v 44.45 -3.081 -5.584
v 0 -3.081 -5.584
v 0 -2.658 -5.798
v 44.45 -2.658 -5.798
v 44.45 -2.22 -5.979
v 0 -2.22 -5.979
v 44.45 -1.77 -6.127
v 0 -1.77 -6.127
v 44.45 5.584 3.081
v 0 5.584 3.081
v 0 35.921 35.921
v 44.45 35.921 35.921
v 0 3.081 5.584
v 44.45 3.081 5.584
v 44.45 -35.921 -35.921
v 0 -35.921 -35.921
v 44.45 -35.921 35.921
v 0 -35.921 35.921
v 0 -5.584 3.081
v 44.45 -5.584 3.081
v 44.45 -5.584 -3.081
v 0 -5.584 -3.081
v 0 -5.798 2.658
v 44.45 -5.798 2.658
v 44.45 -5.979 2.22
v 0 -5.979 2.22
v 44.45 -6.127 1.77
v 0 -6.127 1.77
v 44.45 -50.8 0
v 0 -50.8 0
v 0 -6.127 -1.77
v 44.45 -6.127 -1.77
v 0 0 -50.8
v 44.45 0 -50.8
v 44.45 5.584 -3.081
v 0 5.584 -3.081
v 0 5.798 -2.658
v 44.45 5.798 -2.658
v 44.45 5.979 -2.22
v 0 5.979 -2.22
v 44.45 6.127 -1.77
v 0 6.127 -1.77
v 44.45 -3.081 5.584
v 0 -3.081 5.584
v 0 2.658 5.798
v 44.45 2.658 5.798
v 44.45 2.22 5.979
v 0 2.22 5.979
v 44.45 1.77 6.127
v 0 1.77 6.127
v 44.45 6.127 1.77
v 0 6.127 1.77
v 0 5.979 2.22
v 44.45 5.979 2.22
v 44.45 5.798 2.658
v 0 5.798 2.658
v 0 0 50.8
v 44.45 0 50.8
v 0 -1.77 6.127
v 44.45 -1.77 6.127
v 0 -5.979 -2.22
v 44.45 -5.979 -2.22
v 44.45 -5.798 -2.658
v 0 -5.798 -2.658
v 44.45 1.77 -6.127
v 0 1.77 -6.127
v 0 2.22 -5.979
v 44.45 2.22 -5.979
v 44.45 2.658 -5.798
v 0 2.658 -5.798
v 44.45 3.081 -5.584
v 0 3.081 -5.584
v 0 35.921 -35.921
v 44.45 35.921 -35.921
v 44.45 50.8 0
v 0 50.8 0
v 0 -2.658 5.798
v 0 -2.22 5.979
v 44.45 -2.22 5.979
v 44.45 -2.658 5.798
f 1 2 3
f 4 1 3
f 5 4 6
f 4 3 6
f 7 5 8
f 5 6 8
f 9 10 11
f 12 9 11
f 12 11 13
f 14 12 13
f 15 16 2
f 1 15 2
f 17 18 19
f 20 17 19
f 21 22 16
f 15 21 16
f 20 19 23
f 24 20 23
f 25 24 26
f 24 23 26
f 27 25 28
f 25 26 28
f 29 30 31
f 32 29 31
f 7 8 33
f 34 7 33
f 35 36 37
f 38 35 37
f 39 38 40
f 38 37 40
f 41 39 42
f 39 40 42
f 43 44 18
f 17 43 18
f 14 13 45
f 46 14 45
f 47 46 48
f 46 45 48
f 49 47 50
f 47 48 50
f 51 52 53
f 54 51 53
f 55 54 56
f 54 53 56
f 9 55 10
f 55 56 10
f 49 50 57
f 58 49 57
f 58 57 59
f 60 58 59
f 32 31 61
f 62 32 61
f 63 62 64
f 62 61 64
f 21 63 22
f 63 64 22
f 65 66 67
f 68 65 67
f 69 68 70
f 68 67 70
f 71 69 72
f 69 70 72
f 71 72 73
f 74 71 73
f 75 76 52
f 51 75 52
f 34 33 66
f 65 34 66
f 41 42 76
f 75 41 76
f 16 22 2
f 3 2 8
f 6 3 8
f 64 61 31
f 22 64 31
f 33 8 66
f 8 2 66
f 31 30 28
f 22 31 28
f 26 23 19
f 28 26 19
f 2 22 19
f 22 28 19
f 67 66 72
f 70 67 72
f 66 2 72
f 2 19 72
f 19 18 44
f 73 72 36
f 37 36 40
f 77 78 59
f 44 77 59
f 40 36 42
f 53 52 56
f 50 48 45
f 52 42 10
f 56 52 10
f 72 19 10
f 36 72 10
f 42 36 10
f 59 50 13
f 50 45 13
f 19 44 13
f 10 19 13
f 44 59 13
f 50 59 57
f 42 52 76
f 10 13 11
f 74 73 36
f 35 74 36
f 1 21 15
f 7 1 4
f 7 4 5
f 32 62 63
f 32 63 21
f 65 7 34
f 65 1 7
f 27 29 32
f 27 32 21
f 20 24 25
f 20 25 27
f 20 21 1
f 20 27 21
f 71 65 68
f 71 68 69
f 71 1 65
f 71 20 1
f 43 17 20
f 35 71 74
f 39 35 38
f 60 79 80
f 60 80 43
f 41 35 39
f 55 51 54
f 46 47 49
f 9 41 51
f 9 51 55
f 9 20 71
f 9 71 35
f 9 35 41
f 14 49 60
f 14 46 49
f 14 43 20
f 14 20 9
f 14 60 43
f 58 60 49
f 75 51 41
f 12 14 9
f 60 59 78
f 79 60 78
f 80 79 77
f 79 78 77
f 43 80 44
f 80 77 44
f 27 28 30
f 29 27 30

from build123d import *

# Parameters (mm, degrees)
F1_DEPTH = 44.45


with BuildPart() as f1:
    # F0 (on Right) → F1 (new body)
    with BuildSketch(Plane.YZ):
        with BuildLine():
            Line((0, 0), (6.3777308804, 0))
            ThreePointArc((6.3777308804, 0), (6.3148103285, 0.8936563646), (6.1272901789, 1.7696797019))
            Line((6.1272901789, 1.7696797019), (4.4347789139, 1.8367274105))
            Line((4.4347789139, 1.8367274105), (1.9357257406, 1.9357257406))
            Line((1.9357257406, 1.9357257406), (0, 0))
        make_face()
        with BuildLine():
            Line((50.8, 0), (6.3777308804, 0))
            ThreePointArc((6.3777308804, 0), (6.3148103285, -0.8936563646), (6.1272901789, -1.7696797019))
            Line((6.1272901789, -1.7696797019), (50.8, 0))
        make_face()
        with BuildLine():
            ThreePointArc((6.1272901789, -1.7696797019), (6.3148103285, -0.8936563646), (6.3777308804, 0))
            Line((6.3777308804, 0), (0, 0))
            Line((0, 0), (1.9357257406, -1.9357257406))
            Line((1.9357257406, -1.9357257406), (4.4347789139, -1.8367274105))
            Line((4.4347789139, -1.8367274105), (6.1272901789, -1.7696797019))
        make_face()
        with BuildLine():
            ThreePointArc((6.1272901789, 1.7696797019), (6.3148103285, 0.8936563646), (6.3777308804, 0))
            Line((6.3777308804, 0), (50.8, 0))
            Line((50.8, 0), (6.1272901789, 1.7696797019))
        make_face()
        with BuildLine():
            Line((4.4347789139, 1.8367274105), (6.1272901789, 1.7696797019))
            ThreePointArc((6.1272901789, 1.7696797019), (5.8923261289, 2.4404802754), (5.5841804878, 3.0809705392))
            Line((5.5841804878, 3.0809705392), (4.4347789139, 1.8367274105))
        make_face()
        with BuildLine():
            ThreePointArc((5.5841804878, -3.0809705392), (5.8923261289, -2.4404802754), (6.1272901789, -1.7696797019))
            Line((6.1272901789, -1.7696797019), (4.4347789139, -1.8367274105))
            Line((4.4347789139, -1.8367274105), (5.5841804878, -3.0809705392))
        make_face()
        with BuildLine():
            Line((-1.9357257406, -1.9357257406), (0, 0))
            Line((0, 0), (-6.3777308804, 0))
            ThreePointArc((-6.3777308804, 0), (-6.3148103285, -0.8936563646), (-6.1272901789, -1.7696797019))
            Line((-6.1272901789, -1.7696797019), (-4.4347789139, -1.8367274105))
            Line((-4.4347789139, -1.8367274105), (-1.9357257406, -1.9357257406))
        make_face()
        with BuildLine():
            Line((-6.3777308804, 0), (0, 0))
            Line((0, 0), (-1.9357257406, 1.9357257406))
            Line((-1.9357257406, 1.9357257406), (-4.4347789139, 1.8367274105))
            Line((-4.4347789139, 1.8367274105), (-6.1272901789, 1.7696797019))
            ThreePointArc((-6.1272901789, 1.7696797019), (-6.3148103285, 0.8936563646), (-6.3777308804, 0))
        make_face()
        with BuildLine():
            Line((-1.9357257406, 1.9357257406), (0, 0))
            Line((0, 0), (0, 6.3777308804))
            ThreePointArc((0, 6.3777308804), (-0.8936563646, 6.3148103285), (-1.7696797019, 6.1272901789))
            Line((-1.7696797019, 6.1272901789), (-1.8367274105, 4.4347789139))
            Line((-1.8367274105, 4.4347789139), (-1.9357257406, 1.9357257406))
        make_face()
        with BuildLine():
            Line((0, 6.3777308804), (0, 0))
            Line((0, 0), (1.9357257406, 1.9357257406))
            Line((1.9357257406, 1.9357257406), (1.8367274105, 4.4347789139))
            Line((1.8367274105, 4.4347789139), (1.7696797019, 6.1272901789))
            ThreePointArc((1.7696797019, 6.1272901789), (0.8936563646, 6.3148103285), (0, 6.3777308804))
        make_face()
        with BuildLine():
            Line((1.9357257406, -1.9357257406), (0, 0))
            Line((0, 0), (0, -6.3777308804))
            ThreePointArc((0, -6.3777308804), (0.8936563646, -6.3148103285), (1.7696797019, -6.1272901789))
            Line((1.7696797019, -6.1272901789), (1.8367274105, -4.4347789139))
            Line((1.8367274105, -4.4347789139), (1.9357257406, -1.9357257406))
        make_face()
        with BuildLine():
            Line((0, -6.3777308804), (0, 0))
            Line((0, 0), (-1.9357257406, -1.9357257406))
            Line((-1.9357257406, -1.9357257406), (-1.8367274105, -4.4347789139))
            Line((-1.8367274105, -4.4347789139), (-1.7696797019, -6.1272901789))
            ThreePointArc((-1.7696797019, -6.1272901789), (-0.8936563646, -6.3148103285), (0, -6.3777308804))
        make_face()
        with BuildLine():
            Line((4.4347789139, 1.8367274105), (5.5841804878, 3.0809705392))
            ThreePointArc((5.5841804878, 3.0809705392), (5.0972673606, 3.8331862252), (4.5097367541, 4.5097367541))
            Line((4.5097367541, 4.5097367541), (1.9357257406, 1.9357257406))
            Line((1.9357257406, 1.9357257406), (4.4347789139, 1.8367274105))
        make_face()
        with BuildLine():
            ThreePointArc((4.5097367541, 4.5097367541), (5.0972673606, 3.8331862252), (5.5841804878, 3.0809705392))
            Line((5.5841804878, 3.0809705392), (35.9210244843, 35.9210244843))
            Line((35.9210244843, 35.9210244843), (4.5097367541, 4.5097367541))
        make_face()
        with BuildLine():
            Line((35.9210244843, -35.9210244843), (5.5841804878, -3.0809705392))
            ThreePointArc((5.5841804878, -3.0809705392), (5.0972673606, -3.8331862252), (4.5097367541, -4.5097367541))
            Line((4.5097367541, -4.5097367541), (35.9210244843, -35.9210244843))
        make_face()
        with BuildLine():
            ThreePointArc((4.5097367541, -4.5097367541), (5.0972673606, -3.8331862252), (5.5841804878, -3.0809705392))
            Line((5.5841804878, -3.0809705392), (4.4347789139, -1.8367274105))
            Line((4.4347789139, -1.8367274105), (1.9357257406, -1.9357257406))
            Line((1.9357257406, -1.9357257406), (4.5097367541, -4.5097367541))
        make_face()
        with BuildLine():
            Line((-50.8, 0), (-6.3777308804, 0))
            ThreePointArc((-6.3777308804, 0), (-6.3148103285, 0.8936563646), (-6.1272901789, 1.7696797019))
            Line((-6.1272901789, 1.7696797019), (-50.8, 0))
        make_face()
        with BuildLine():
            ThreePointArc((-6.1272901789, -1.7696797019), (-6.3148103285, -0.8936563646), (-6.3777308804, 0))
            Line((-6.3777308804, 0), (-50.8, 0))
            Line((-50.8, 0), (-6.1272901789, -1.7696797019))
        make_face()
        with BuildLine():
            Line((-4.4347789139, 1.8367274105), (-1.9357257406, 1.9357257406))
            Line((-1.9357257406, 1.9357257406), (-4.5097367541, 4.5097367541))
            ThreePointArc((-4.5097367541, 4.5097367541), (-5.0972673606, 3.8331862252), (-5.5841804878, 3.0809705392))
            Line((-5.5841804878, 3.0809705392), (-4.4347789139, 1.8367274105))
        make_face()
        with BuildLine():
            Line((-4.5097367541, 4.5097367541), (-1.9357257406, 1.9357257406))
            Line((-1.9357257406, 1.9357257406), (-1.8367274105, 4.4347789139))
            Line((-1.8367274105, 4.4347789139), (-3.0809705392, 5.5841804878))
            ThreePointArc((-3.0809705392, 5.5841804878), (-3.8331862252, 5.0972673606), (-4.5097367541, 4.5097367541))
        make_face()
        with BuildLine():
            Line((0, 50.8), (0, 6.3777308804))
            ThreePointArc((0, 6.3777308804), (0.8936563646, 6.3148103285), (1.7696797019, 6.1272901789))
            Line((1.7696797019, 6.1272901789), (0, 50.8))
        make_face()
        with BuildLine():
            ThreePointArc((-1.7696797019, 6.1272901789), (-0.8936563646, 6.3148103285), (0, 6.3777308804))
            Line((0, 6.3777308804), (0, 50.8))
            Line((0, 50.8), (-1.7696797019, 6.1272901789))
        make_face()
        with BuildLine():
            Line((1.8367274105, 4.4347789139), (1.9357257406, 1.9357257406))
            Line((1.9357257406, 1.9357257406), (4.5097367541, 4.5097367541))
            ThreePointArc((4.5097367541, 4.5097367541), (3.8331862252, 5.0972673606), (3.0809705392, 5.5841804878))
            Line((3.0809705392, 5.5841804878), (1.8367274105, 4.4347789139))
        make_face()
        with BuildLine():
            Line((4.5097367541, -4.5097367541), (1.9357257406, -1.9357257406))
            Line((1.9357257406, -1.9357257406), (1.8367274105, -4.4347789139))
            Line((1.8367274105, -4.4347789139), (3.0809705392, -5.5841804878))
            ThreePointArc((3.0809705392, -5.5841804878), (3.8331862252, -5.0972673606), (4.5097367541, -4.5097367541))
        make_face()
        with BuildLine():
            Line((0, -50.8), (0, -6.3777308804))
            ThreePointArc((0, -6.3777308804), (-0.8936563646, -6.3148103285), (-1.7696797019, -6.1272901789))
            Line((-1.7696797019, -6.1272901789), (0, -50.8))
        make_face()
        with BuildLine():
            ThreePointArc((1.7696797019, -6.1272901789), (0.8936563646, -6.3148103285), (0, -6.3777308804))
            Line((0, -6.3777308804), (0, -50.8))
            Line((0, -50.8), (1.7696797019, -6.1272901789))
        make_face()
        with BuildLine():
            Line((-1.8367274105, -4.4347789139), (-1.9357257406, -1.9357257406))
            Line((-1.9357257406, -1.9357257406), (-4.5097367541, -4.5097367541))
            ThreePointArc((-4.5097367541, -4.5097367541), (-3.8331862252, -5.0972673606), (-3.0809705392, -5.5841804878))
            Line((-3.0809705392, -5.5841804878), (-1.8367274105, -4.4347789139))
        make_face()
        with BuildLine():
            Line((-4.5097367541, -4.5097367541), (-1.9357257406, -1.9357257406))
            Line((-1.9357257406, -1.9357257406), (-4.4347789139, -1.8367274105))
            Line((-4.4347789139, -1.8367274105), (-5.5841804878, -3.0809705392))
            ThreePointArc((-5.5841804878, -3.0809705392), (-5.0972673606, -3.8331862252), (-4.5097367541, -4.5097367541))
        make_face()
        with BuildLine():
            ThreePointArc((3.0809705392, 5.5841804878), (3.8331862252, 5.0972673606), (4.5097367541, 4.5097367541))
            Line((4.5097367541, 4.5097367541), (35.9210244843, 35.9210244843))
            Line((35.9210244843, 35.9210244843), (3.0809705392, 5.5841804878))
        make_face()
        with BuildLine():
            Line((35.9210244843, -35.9210244843), (4.5097367541, -4.5097367541))
            ThreePointArc((4.5097367541, -4.5097367541), (3.8331862252, -5.0972673606), (3.0809705392, -5.5841804878))
            Line((3.0809705392, -5.5841804878), (35.9210244843, -35.9210244843))
        make_face()
        with BuildLine():
            ThreePointArc((-5.5841804878, 3.0809705392), (-5.8923261289, 2.4404802754), (-6.1272901789, 1.7696797019))
            Line((-6.1272901789, 1.7696797019), (-4.4347789139, 1.8367274105))
            Line((-4.4347789139, 1.8367274105), (-5.5841804878, 3.0809705392))
        make_face()
        with BuildLine():
            Line((-4.4347789139, -1.8367274105), (-6.1272901789, -1.7696797019))
            ThreePointArc((-6.1272901789, -1.7696797019), (-5.8923261289, -2.4404802754), (-5.5841804878, -3.0809705392))
            Line((-5.5841804878, -3.0809705392), (-4.4347789139, -1.8367274105))
        make_face()
        with BuildLine():
            Line((-35.9210244843, 35.9210244843), (-4.5097367541, 4.5097367541))
            ThreePointArc((-4.5097367541, 4.5097367541), (-3.8331862252, 5.0972673606), (-3.0809705392, 5.5841804878))
            Line((-3.0809705392, 5.5841804878), (-35.9210244843, 35.9210244843))
        make_face()
        with BuildLine():
            ThreePointArc((-5.5841804878, 3.0809705392), (-5.0972673606, 3.8331862252), (-4.5097367541, 4.5097367541))
            Line((-4.5097367541, 4.5097367541), (-35.9210244843, 35.9210244843))
            Line((-35.9210244843, 35.9210244843), (-5.5841804878, 3.0809705392))
        make_face()
        with BuildLine():
            Line((-3.0809705392, 5.5841804878), (-1.8367274105, 4.4347789139))
            Line((-1.8367274105, 4.4347789139), (-1.7696797019, 6.1272901789))
            ThreePointArc((-1.7696797019, 6.1272901789), (-2.4404802754, 5.8923261289), (-3.0809705392, 5.5841804878))
        make_face()
        with BuildLine():
            ThreePointArc((3.0809705392, 5.5841804878), (2.4404802754, 5.8923261289), (1.7696797019, 6.1272901789))
            Line((1.7696797019, 6.1272901789), (1.8367274105, 4.4347789139))
            Line((1.8367274105, 4.4347789139), (3.0809705392, 5.5841804878))
        make_face()
        with BuildLine():
            Line((3.0809705392, -5.5841804878), (1.8367274105, -4.4347789139))
            Line((1.8367274105, -4.4347789139), (1.7696797019, -6.1272901789))
            ThreePointArc((1.7696797019, -6.1272901789), (2.4404802754, -5.8923261289), (3.0809705392, -5.5841804878))
        make_face()
        with BuildLine():
            ThreePointArc((-3.0809705392, -5.5841804878), (-2.4404802754, -5.8923261289), (-1.7696797019, -6.1272901789))
            Line((-1.7696797019, -6.1272901789), (-1.8367274105, -4.4347789139))
            Line((-1.8367274105, -4.4347789139), (-3.0809705392, -5.5841804878))
        make_face()
        with BuildLine():
            Line((-35.9210244843, -35.9210244843), (-4.5097367541, -4.5097367541))
            ThreePointArc((-4.5097367541, -4.5097367541), (-5.0972673606, -3.8331862252), (-5.5841804878, -3.0809705392))
            Line((-5.5841804878, -3.0809705392), (-35.9210244843, -35.9210244843))
        make_face()
        with BuildLine():
            ThreePointArc((-3.0809705392, -5.5841804878), (-3.8331862252, -5.0972673606), (-4.5097367541, -4.5097367541))
            Line((-4.5097367541, -4.5097367541), (-35.9210244843, -35.9210244843))
            Line((-35.9210244843, -35.9210244843), (-3.0809705392, -5.5841804878))
        make_face()
    extrude(amount=F1_DEPTH)


solid = f1.part
